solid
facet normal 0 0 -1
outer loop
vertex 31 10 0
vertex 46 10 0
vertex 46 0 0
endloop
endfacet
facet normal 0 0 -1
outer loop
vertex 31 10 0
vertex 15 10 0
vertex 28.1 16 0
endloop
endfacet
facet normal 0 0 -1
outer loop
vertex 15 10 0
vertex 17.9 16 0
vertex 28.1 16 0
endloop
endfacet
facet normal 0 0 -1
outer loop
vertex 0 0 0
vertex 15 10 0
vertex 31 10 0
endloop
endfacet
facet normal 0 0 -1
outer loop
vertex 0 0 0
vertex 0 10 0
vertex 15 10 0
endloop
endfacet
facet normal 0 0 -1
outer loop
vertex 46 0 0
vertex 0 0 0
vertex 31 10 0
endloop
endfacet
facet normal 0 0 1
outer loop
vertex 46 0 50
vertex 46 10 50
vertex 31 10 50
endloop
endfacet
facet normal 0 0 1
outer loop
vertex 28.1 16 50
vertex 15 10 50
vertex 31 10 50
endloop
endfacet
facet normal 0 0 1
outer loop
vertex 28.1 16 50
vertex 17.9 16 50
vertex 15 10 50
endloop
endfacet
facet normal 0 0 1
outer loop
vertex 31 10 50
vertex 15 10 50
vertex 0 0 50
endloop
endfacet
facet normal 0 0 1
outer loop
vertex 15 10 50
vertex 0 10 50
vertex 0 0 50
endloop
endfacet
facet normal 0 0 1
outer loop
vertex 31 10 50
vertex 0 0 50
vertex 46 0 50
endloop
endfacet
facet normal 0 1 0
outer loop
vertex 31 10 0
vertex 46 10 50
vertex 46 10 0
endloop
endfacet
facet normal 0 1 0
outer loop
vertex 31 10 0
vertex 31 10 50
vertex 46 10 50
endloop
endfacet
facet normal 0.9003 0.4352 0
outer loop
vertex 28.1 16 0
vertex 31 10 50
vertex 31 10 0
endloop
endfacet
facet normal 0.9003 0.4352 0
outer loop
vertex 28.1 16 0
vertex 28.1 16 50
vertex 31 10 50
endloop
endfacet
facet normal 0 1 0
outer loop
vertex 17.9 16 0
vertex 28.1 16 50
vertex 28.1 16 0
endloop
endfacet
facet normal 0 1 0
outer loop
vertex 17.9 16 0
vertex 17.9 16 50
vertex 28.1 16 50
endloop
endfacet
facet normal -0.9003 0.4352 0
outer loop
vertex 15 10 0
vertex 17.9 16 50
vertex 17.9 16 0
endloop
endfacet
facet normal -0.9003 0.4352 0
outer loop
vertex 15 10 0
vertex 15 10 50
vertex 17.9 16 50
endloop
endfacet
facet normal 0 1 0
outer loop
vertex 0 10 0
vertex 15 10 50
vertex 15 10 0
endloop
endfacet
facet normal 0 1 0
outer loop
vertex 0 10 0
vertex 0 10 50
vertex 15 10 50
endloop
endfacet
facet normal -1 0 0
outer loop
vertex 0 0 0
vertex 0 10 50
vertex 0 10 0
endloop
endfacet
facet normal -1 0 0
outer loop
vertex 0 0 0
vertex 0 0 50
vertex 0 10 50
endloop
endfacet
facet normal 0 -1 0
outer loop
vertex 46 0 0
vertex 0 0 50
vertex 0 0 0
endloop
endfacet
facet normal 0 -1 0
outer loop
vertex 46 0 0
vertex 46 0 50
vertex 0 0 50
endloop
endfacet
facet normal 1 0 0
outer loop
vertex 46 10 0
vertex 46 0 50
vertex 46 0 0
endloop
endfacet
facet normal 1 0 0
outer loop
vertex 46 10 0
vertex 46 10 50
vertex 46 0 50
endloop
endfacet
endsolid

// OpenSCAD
$fn = 32;

// ----------------------------------------------------------------------
// V guide rail: dovetail, 46 mm wide
// ----------------------------------------------------------------------

// --- parameters (mm) ---
rail_w = 46;              // rail width, X
base_t = 10;              // base plate thickness
v_depth = 6;              // V feature depth / height
v_half_w = 8;             // half width of the V at the base face
plate_t = 50;             // rail length, Z (the extrusion height)
top_half_w = 5.1;         // half width at the dovetail top
fit_tol = 0.05;           // declared fit tolerance (prompt contract)
free_tol = 0.2;           // declared free tolerance (prompt contract)

dovetail_base = 2 * v_half_w;  // dovetail width at the base
dovetail_top = 2 * top_half_w;  // dovetail width at the top

profile = [[0, 0], [46, 0], [46, 10], [31, 10], [28.1, 16], [17.9, 16], [15, 10], [0, 10]];  // primary outline, 8 points, counter clockwise

// --- the one profile operation ---
linear_extrude(height = plate_t) polygon(points = profile);
